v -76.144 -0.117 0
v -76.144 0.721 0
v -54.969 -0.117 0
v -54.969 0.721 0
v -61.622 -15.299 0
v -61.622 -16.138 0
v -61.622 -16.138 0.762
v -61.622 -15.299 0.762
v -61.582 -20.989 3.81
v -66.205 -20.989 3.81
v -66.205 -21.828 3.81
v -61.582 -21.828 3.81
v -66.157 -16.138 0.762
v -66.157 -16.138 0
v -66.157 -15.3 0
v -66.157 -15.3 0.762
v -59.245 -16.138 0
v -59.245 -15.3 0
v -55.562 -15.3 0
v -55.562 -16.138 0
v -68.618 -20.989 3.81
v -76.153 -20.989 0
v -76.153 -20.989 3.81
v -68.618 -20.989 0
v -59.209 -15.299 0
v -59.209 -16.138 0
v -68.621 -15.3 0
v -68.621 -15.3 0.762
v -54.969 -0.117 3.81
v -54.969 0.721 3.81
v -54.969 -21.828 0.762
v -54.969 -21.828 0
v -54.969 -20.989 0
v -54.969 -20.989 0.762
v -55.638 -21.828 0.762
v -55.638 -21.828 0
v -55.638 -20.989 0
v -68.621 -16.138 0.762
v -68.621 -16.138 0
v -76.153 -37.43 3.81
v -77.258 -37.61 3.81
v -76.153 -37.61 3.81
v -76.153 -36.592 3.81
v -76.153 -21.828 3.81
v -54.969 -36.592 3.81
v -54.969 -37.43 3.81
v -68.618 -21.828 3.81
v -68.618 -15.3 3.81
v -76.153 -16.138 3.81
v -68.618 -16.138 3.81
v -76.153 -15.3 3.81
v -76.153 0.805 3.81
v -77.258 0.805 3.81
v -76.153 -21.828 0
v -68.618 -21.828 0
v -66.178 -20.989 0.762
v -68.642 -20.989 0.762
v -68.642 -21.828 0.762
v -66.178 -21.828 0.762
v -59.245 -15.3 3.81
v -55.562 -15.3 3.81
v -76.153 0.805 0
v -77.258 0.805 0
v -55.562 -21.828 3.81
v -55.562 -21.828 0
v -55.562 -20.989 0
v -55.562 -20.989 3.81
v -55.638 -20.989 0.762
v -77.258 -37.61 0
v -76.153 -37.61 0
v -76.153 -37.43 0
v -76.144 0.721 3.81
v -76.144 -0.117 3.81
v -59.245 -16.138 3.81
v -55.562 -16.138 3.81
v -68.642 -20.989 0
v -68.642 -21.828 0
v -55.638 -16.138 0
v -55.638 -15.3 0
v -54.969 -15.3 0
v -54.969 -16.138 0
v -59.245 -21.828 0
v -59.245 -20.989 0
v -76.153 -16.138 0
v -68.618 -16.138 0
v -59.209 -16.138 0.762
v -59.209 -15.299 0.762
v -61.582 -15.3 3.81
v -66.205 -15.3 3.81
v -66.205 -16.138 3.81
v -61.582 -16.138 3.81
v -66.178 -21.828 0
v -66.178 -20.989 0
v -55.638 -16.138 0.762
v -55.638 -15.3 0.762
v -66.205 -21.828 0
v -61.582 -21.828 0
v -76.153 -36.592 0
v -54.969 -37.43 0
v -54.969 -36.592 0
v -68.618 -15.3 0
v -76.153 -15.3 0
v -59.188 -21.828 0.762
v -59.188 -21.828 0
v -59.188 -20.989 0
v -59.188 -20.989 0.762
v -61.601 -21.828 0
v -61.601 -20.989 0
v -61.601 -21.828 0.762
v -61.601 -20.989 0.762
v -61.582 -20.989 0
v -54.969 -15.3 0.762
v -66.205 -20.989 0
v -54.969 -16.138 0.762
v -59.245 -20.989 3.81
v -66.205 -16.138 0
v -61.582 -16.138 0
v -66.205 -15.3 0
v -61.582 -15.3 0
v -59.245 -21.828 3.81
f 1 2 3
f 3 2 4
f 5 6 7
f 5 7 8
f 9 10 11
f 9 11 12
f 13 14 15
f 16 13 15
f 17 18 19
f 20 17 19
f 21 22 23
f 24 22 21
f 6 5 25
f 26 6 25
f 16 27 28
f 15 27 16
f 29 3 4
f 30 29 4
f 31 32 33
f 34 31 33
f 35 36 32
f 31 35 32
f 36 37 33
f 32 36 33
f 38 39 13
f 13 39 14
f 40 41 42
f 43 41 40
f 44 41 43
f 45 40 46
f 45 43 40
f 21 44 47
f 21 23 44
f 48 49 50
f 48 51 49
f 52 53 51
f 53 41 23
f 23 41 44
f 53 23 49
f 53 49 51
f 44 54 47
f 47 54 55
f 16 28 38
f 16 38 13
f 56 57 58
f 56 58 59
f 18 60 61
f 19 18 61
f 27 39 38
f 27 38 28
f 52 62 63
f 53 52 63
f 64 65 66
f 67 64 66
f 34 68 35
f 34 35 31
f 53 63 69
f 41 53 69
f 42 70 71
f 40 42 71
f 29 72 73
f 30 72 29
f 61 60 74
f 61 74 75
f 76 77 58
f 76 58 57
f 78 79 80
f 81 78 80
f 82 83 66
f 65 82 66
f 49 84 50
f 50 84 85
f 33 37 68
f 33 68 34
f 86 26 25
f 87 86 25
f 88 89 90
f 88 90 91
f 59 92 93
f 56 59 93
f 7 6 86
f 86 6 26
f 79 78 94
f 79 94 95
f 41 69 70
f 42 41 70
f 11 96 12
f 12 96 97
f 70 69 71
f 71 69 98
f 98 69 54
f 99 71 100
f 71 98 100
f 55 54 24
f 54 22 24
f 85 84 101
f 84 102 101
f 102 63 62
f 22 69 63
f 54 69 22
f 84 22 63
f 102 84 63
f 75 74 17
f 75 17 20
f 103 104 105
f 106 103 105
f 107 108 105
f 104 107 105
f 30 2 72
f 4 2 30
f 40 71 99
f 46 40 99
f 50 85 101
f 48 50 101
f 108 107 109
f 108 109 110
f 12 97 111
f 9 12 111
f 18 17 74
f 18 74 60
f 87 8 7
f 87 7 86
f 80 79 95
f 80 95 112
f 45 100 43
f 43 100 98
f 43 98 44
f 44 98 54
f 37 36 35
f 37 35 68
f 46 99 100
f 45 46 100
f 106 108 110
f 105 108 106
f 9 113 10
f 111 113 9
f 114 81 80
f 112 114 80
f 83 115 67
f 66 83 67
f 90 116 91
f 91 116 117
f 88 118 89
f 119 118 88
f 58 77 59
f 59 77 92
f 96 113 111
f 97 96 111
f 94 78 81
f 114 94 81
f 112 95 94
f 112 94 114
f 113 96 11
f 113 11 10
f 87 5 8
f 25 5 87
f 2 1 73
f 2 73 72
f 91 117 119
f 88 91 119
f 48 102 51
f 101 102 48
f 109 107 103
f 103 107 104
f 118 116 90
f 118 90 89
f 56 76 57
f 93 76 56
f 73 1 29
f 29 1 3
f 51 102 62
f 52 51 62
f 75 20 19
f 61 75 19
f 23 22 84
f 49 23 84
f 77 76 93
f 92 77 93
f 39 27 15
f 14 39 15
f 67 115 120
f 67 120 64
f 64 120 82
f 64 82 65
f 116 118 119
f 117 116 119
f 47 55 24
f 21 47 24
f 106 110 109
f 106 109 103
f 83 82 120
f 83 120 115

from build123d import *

# Parameters (mm, degrees)
F0_W     = 21.174676846
F0_H     = 0.8382
F1_DEPTH = 3.81
F0_W_2   = 21.1836360395
F0_W_3   = 1.046679914
F0_W_4   = 7.5350500569
F0_W_5   = 1.1009499431
F0_W_6   = 4.6228
F0_W_7   = 3.683
F2_W     = 2.4638
F2_H     = 0.8382
F3_DEPTH = 0.762
F2_W_2   = 2.413
F2_W_3   = 0.6691376


with BuildPart() as f1:
    # F0 (on Top) → F1 (new body)
    with BuildSketch(Plane.XY):
        with Locations((-65.556432987, 0.3016160522)):
            Rectangle(F0_W, F0_H)
    extrude(amount=F1_DEPTH)


with BuildPart() as f1b:
    # F0 (on Top) → F1, piece 2 (new body)
    with BuildSketch(Plane.XY):
        with Locations((-65.5609313399, -37.0110188411)):
            Rectangle(F0_W_2, F0_H)
        with Locations((-76.6760893166, -37.0110188411)):
            Rectangle(F0_W_3, F0_H)
        Polygon((-77.1994292736, -36.5919188411), (-76.1527493596, -36.5919188411), (-76.1527493596, -21.8275338411), (-77.2536993027, -21.8275338411), (-77.2536993027, -20.9893338411), (-76.1527493596, -20.9893338411), (-76.1527493596, -16.1379338411), (-77.2536993027, -16.1379338411), (-77.2536993027, -15.2997338411), (-76.1527493596, -15.2997338411), (-76.1527493596, 0.805442092), (-77.2577896714, 0.805442092), (-77.2577896714, -37.609949708), (-76.1527493596, -37.609949708), (-76.1527493596, -37.4301188411), (-77.1994292736, -37.4301188411), align=None)
        with Locations((-72.3852243311, -21.4084338411)):
            Rectangle(F0_W_4, F0_H)
        with Locations((-76.7032243311, -21.4084338411)):
            Rectangle(F0_W_5, F0_H)
        with Locations((-72.3852243311, -15.7188338411)):
            Rectangle(F0_W_4, F0_H)
        with Locations((-76.7032243311, -15.7188338411)):
            Rectangle(F0_W_5, F0_H)
    extrude(amount=F1_DEPTH)


with BuildPart() as f1c:
    # F0 (on Top) → F1, piece 3 (new body)
    with BuildSketch(Plane.XY):
        with Locations((-63.8932993027, -15.7188338411)):
            Rectangle(F0_W_6, F0_H)
    extrude(amount=F1_DEPTH)


with BuildPart() as f1d:
    # F0 (on Top) → F1, piece 4 (new body)
    with BuildSketch(Plane.XY):
        with Locations((-63.8932993027, -21.4084338411)):
            Rectangle(F0_W_6, F0_H)
    extrude(amount=F1_DEPTH)


with BuildPart() as f1e:
    # F0 (on Top) → F1, piece 5 (new body)
    with BuildSketch(Plane.XY):
        with Locations((-57.4035993027, -21.4084338411)):
            Rectangle(F0_W_7, F0_H)
    extrude(amount=F1_DEPTH)


with BuildPart() as f1f:
    # F0 (on Top) → F1, piece 6 (new body)
    with BuildSketch(Plane.XY):
        with Locations((-57.4035993027, -15.7188338411)):
            Rectangle(F0_W_7, F0_H)
    extrude(amount=F1_DEPTH)


with BuildPart() as f3:
    # F2 (on Top) → F3 (new body)
    with BuildSketch(Plane.XY):
        with Locations((-67.3887850354, -15.7187578801)):
            Rectangle(F2_W, F2_H)
    extrude(amount=F3_DEPTH)


with BuildPart() as f3b:
    # F2 (on Top) → F3, piece 2 (new body)
    with BuildSketch(Plane.XY):
        with Locations((-67.4098059485, -21.4084152412)):
            Rectangle(F2_W, F2_H)
    extrude(amount=F3_DEPTH)


with BuildPart() as f3c:
    # F2 (on Top) → F3, piece 3 (new body)
    with BuildSketch(Plane.XY):
        with Locations((-60.4155172818, -15.718545642)):
            Rectangle(F2_W_2, F2_H)
    extrude(amount=F3_DEPTH)


with BuildPart() as f3d:
    # F2 (on Top) → F3, piece 4 (new body)
    with BuildSketch(Plane.XY):
        with Locations((-60.3941102723, -21.4084460192)):
            Rectangle(F2_W_2, F2_H)
    extrude(amount=F3_DEPTH)


with BuildPart() as f3e:
    # F2 (on Top) → F3, piece 5 (new body)
    with BuildSketch(Plane.XY):
        with Locations((-55.3037305027, -15.7187973504)):
            Rectangle(F2_W_3, F2_H)
    extrude(amount=F3_DEPTH)


with BuildPart() as f3f:
    # F2 (on Top) → F3, piece 6 (new body)
    with BuildSketch(Plane.XY):
        with Locations((-55.3037305027, -21.4084160856)):
            Rectangle(F2_W_3, F2_H)
    extrude(amount=F3_DEPTH)


solid = Compound([f1.part, f1b.part, f1c.part, f1d.part, f1e.part, f1f.part, f3.part, f3b.part, f3c.part, f3d.part, f3e.part, f3f.part])
